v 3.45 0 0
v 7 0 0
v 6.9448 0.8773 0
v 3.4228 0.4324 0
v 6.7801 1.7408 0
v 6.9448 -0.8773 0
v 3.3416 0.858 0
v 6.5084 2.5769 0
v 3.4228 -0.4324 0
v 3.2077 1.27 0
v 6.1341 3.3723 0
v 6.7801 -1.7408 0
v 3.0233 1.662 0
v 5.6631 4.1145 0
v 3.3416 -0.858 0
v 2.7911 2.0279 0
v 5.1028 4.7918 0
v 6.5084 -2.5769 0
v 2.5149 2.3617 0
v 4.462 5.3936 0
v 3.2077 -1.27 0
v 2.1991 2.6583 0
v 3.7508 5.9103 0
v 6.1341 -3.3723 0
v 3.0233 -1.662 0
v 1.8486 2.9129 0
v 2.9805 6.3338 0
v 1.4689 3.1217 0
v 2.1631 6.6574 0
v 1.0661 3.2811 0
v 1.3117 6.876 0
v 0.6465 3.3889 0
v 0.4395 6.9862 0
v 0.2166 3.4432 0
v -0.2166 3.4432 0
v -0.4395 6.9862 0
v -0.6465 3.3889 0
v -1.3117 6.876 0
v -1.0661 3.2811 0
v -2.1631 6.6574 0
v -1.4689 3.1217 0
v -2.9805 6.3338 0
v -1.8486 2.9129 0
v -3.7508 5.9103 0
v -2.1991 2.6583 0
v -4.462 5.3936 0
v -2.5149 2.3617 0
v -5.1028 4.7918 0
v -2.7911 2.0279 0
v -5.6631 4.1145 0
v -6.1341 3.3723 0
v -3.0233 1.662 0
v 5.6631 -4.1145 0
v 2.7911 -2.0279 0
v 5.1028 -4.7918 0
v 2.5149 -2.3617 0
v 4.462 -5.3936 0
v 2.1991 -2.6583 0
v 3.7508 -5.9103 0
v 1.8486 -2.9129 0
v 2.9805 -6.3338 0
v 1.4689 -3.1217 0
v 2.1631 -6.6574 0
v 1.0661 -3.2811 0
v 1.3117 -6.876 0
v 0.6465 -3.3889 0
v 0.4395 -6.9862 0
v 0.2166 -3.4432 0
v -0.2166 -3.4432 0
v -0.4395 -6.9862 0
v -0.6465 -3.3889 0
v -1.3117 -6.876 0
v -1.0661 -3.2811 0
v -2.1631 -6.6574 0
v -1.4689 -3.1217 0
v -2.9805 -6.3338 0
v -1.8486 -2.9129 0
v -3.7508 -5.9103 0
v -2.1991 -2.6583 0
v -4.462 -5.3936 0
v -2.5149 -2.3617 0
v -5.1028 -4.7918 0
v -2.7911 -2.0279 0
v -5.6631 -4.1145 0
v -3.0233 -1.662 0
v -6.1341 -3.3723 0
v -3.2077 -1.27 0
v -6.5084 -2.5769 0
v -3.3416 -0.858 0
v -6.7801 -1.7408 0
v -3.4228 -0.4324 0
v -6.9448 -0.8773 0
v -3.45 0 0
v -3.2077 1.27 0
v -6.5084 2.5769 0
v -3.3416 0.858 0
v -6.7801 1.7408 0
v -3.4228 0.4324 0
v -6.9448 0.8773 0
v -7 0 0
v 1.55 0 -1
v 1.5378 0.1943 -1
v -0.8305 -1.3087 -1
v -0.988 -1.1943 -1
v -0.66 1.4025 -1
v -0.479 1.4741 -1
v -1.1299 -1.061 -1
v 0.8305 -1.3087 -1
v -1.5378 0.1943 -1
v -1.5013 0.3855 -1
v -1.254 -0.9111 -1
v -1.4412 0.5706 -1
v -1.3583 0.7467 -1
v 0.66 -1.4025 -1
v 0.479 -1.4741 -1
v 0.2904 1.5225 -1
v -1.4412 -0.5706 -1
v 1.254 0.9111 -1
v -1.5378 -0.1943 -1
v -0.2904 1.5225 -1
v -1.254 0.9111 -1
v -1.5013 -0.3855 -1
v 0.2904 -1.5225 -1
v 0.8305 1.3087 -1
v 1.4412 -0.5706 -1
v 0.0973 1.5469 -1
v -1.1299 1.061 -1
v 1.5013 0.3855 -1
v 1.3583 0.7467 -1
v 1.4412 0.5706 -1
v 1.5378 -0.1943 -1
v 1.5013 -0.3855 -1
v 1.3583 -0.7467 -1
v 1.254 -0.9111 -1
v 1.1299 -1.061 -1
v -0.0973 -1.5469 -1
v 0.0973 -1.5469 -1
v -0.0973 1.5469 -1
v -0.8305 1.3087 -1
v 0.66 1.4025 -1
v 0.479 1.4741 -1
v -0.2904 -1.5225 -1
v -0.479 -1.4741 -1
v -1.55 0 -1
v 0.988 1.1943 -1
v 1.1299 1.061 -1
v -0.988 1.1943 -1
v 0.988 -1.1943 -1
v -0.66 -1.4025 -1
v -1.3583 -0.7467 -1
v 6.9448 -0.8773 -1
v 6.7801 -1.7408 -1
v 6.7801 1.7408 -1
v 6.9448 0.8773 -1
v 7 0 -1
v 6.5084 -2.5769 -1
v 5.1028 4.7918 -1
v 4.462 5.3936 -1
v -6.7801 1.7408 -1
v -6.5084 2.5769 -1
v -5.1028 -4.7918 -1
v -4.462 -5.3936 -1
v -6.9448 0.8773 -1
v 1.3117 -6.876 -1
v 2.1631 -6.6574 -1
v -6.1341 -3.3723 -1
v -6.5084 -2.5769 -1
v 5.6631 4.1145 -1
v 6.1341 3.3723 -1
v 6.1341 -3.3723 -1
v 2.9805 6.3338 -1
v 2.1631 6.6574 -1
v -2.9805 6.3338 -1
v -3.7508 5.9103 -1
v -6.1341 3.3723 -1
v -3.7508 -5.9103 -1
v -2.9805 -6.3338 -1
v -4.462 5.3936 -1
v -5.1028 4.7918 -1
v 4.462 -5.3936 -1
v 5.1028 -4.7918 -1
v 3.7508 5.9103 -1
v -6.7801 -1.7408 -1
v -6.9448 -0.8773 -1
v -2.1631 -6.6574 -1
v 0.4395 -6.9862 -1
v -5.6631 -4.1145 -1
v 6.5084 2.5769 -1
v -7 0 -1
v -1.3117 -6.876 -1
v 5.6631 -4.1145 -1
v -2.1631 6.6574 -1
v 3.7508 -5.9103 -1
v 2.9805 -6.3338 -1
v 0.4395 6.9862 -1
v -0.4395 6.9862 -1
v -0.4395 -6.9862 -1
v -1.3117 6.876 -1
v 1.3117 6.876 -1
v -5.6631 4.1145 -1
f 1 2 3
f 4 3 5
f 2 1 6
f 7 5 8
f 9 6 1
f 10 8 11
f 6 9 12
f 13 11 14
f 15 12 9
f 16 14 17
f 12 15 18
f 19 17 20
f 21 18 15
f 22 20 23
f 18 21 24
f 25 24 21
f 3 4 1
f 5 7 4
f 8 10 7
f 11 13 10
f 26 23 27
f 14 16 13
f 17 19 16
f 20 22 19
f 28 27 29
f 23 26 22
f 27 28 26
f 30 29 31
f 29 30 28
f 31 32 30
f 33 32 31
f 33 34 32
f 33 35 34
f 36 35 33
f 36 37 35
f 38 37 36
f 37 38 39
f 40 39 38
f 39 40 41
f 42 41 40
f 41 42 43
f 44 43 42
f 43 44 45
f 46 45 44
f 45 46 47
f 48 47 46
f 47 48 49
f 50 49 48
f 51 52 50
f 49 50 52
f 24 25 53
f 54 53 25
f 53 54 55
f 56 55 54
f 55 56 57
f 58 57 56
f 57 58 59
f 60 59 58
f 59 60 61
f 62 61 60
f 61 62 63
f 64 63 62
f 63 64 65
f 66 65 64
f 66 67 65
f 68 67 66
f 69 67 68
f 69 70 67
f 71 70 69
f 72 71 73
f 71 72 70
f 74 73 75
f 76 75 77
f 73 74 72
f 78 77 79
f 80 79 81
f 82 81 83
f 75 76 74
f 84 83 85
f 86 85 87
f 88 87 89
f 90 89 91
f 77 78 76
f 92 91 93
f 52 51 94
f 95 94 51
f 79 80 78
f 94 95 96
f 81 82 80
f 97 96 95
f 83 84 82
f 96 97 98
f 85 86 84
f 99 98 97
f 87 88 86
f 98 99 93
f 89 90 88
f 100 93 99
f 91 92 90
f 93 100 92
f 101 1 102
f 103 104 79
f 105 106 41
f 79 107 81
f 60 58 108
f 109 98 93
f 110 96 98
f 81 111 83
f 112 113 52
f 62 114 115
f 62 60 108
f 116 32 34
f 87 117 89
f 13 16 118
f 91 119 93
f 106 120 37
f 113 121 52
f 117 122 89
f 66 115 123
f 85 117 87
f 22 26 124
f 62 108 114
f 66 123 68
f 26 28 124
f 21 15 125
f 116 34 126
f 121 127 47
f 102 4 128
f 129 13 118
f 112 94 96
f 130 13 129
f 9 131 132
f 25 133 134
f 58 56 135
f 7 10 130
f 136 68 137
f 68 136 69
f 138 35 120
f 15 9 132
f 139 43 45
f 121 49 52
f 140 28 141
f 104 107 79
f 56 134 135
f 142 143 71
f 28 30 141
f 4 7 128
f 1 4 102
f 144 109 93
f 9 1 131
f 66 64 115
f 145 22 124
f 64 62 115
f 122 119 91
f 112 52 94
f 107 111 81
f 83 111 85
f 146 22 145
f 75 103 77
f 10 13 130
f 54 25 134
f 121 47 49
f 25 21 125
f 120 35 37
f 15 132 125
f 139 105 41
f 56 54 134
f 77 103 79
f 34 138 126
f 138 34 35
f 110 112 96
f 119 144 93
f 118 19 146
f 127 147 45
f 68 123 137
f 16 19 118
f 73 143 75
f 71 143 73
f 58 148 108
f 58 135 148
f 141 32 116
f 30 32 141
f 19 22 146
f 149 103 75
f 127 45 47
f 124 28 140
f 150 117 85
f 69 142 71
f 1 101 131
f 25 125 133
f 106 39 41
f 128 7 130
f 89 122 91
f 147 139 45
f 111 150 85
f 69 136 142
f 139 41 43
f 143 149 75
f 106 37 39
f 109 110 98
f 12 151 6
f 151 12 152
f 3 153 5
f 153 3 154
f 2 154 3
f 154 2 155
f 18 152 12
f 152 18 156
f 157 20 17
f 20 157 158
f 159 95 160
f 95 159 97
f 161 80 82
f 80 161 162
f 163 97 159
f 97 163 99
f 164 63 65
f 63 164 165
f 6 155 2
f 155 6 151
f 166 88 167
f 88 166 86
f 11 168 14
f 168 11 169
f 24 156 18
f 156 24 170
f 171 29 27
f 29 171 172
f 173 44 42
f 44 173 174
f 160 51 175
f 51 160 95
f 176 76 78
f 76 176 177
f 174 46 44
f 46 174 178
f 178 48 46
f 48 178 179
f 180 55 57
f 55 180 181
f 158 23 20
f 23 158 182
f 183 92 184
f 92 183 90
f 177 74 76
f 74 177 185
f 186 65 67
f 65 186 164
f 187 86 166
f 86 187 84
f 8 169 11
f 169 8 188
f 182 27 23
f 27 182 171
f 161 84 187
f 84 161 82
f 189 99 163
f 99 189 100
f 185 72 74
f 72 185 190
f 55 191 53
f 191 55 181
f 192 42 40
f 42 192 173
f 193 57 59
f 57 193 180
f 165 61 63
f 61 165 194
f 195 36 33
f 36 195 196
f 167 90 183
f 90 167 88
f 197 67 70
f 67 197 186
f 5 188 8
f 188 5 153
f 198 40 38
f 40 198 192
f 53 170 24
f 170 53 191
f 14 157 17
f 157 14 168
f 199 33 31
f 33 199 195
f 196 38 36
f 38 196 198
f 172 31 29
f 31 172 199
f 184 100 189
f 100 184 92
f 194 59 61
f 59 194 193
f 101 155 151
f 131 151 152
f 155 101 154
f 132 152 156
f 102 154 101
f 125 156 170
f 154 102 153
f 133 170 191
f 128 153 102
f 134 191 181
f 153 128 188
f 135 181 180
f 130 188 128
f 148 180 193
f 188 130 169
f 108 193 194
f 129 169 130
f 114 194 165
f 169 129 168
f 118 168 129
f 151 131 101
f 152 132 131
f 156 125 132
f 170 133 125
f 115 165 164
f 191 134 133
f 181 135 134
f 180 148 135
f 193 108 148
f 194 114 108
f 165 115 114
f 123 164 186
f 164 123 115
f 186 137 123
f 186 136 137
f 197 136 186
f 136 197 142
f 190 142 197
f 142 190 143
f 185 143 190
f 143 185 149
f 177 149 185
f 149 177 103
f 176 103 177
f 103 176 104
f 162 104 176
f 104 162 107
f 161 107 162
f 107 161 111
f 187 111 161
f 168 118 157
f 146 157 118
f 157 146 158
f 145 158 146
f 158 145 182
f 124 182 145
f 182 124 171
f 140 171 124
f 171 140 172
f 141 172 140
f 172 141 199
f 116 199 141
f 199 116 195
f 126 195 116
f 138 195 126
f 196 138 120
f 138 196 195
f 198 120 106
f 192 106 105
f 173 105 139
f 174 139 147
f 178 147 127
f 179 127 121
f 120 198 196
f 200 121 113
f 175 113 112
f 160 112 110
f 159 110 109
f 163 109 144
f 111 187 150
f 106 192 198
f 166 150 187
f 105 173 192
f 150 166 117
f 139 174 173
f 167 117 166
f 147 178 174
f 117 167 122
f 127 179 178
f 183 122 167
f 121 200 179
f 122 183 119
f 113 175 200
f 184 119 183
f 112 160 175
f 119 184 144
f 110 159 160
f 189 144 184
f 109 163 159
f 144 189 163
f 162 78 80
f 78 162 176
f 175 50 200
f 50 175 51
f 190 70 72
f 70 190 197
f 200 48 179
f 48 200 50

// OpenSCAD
$fn = 50;


difference() {
	union() {
		translate(v = [0, 0, -1.0000000000]) {
			cylinder(h = 1.0000000000, r = 7.0000000000);
		}
	}
	union() {
		translate(v = [0, 0, 0]) {
			rotate(a = [0, 0, 0]) {
				difference() {
					union() {
						translate(v = [0, 0, -4.0000000000]) {
							cylinder(h = 4.0000000000, r = 1.2500000000);
						}
						translate(v = [0, 0, -1.0000000000]) {
							cylinder(h = 1.0000000000, r1 = 1.5500000000, r2 = 3.4500000000);
						}
						translate(v = [0, 0, -4.0000000000]) {
							cylinder(h = 4.0000000000, r = 1.5500000000);
						}
						translate(v = [0, 0, -4.0000000000]) {
							cylinder(h = 4.0000000000, r = 1.2500000000);
						}
					}
					union();
				}
			}
		}
	}
}
